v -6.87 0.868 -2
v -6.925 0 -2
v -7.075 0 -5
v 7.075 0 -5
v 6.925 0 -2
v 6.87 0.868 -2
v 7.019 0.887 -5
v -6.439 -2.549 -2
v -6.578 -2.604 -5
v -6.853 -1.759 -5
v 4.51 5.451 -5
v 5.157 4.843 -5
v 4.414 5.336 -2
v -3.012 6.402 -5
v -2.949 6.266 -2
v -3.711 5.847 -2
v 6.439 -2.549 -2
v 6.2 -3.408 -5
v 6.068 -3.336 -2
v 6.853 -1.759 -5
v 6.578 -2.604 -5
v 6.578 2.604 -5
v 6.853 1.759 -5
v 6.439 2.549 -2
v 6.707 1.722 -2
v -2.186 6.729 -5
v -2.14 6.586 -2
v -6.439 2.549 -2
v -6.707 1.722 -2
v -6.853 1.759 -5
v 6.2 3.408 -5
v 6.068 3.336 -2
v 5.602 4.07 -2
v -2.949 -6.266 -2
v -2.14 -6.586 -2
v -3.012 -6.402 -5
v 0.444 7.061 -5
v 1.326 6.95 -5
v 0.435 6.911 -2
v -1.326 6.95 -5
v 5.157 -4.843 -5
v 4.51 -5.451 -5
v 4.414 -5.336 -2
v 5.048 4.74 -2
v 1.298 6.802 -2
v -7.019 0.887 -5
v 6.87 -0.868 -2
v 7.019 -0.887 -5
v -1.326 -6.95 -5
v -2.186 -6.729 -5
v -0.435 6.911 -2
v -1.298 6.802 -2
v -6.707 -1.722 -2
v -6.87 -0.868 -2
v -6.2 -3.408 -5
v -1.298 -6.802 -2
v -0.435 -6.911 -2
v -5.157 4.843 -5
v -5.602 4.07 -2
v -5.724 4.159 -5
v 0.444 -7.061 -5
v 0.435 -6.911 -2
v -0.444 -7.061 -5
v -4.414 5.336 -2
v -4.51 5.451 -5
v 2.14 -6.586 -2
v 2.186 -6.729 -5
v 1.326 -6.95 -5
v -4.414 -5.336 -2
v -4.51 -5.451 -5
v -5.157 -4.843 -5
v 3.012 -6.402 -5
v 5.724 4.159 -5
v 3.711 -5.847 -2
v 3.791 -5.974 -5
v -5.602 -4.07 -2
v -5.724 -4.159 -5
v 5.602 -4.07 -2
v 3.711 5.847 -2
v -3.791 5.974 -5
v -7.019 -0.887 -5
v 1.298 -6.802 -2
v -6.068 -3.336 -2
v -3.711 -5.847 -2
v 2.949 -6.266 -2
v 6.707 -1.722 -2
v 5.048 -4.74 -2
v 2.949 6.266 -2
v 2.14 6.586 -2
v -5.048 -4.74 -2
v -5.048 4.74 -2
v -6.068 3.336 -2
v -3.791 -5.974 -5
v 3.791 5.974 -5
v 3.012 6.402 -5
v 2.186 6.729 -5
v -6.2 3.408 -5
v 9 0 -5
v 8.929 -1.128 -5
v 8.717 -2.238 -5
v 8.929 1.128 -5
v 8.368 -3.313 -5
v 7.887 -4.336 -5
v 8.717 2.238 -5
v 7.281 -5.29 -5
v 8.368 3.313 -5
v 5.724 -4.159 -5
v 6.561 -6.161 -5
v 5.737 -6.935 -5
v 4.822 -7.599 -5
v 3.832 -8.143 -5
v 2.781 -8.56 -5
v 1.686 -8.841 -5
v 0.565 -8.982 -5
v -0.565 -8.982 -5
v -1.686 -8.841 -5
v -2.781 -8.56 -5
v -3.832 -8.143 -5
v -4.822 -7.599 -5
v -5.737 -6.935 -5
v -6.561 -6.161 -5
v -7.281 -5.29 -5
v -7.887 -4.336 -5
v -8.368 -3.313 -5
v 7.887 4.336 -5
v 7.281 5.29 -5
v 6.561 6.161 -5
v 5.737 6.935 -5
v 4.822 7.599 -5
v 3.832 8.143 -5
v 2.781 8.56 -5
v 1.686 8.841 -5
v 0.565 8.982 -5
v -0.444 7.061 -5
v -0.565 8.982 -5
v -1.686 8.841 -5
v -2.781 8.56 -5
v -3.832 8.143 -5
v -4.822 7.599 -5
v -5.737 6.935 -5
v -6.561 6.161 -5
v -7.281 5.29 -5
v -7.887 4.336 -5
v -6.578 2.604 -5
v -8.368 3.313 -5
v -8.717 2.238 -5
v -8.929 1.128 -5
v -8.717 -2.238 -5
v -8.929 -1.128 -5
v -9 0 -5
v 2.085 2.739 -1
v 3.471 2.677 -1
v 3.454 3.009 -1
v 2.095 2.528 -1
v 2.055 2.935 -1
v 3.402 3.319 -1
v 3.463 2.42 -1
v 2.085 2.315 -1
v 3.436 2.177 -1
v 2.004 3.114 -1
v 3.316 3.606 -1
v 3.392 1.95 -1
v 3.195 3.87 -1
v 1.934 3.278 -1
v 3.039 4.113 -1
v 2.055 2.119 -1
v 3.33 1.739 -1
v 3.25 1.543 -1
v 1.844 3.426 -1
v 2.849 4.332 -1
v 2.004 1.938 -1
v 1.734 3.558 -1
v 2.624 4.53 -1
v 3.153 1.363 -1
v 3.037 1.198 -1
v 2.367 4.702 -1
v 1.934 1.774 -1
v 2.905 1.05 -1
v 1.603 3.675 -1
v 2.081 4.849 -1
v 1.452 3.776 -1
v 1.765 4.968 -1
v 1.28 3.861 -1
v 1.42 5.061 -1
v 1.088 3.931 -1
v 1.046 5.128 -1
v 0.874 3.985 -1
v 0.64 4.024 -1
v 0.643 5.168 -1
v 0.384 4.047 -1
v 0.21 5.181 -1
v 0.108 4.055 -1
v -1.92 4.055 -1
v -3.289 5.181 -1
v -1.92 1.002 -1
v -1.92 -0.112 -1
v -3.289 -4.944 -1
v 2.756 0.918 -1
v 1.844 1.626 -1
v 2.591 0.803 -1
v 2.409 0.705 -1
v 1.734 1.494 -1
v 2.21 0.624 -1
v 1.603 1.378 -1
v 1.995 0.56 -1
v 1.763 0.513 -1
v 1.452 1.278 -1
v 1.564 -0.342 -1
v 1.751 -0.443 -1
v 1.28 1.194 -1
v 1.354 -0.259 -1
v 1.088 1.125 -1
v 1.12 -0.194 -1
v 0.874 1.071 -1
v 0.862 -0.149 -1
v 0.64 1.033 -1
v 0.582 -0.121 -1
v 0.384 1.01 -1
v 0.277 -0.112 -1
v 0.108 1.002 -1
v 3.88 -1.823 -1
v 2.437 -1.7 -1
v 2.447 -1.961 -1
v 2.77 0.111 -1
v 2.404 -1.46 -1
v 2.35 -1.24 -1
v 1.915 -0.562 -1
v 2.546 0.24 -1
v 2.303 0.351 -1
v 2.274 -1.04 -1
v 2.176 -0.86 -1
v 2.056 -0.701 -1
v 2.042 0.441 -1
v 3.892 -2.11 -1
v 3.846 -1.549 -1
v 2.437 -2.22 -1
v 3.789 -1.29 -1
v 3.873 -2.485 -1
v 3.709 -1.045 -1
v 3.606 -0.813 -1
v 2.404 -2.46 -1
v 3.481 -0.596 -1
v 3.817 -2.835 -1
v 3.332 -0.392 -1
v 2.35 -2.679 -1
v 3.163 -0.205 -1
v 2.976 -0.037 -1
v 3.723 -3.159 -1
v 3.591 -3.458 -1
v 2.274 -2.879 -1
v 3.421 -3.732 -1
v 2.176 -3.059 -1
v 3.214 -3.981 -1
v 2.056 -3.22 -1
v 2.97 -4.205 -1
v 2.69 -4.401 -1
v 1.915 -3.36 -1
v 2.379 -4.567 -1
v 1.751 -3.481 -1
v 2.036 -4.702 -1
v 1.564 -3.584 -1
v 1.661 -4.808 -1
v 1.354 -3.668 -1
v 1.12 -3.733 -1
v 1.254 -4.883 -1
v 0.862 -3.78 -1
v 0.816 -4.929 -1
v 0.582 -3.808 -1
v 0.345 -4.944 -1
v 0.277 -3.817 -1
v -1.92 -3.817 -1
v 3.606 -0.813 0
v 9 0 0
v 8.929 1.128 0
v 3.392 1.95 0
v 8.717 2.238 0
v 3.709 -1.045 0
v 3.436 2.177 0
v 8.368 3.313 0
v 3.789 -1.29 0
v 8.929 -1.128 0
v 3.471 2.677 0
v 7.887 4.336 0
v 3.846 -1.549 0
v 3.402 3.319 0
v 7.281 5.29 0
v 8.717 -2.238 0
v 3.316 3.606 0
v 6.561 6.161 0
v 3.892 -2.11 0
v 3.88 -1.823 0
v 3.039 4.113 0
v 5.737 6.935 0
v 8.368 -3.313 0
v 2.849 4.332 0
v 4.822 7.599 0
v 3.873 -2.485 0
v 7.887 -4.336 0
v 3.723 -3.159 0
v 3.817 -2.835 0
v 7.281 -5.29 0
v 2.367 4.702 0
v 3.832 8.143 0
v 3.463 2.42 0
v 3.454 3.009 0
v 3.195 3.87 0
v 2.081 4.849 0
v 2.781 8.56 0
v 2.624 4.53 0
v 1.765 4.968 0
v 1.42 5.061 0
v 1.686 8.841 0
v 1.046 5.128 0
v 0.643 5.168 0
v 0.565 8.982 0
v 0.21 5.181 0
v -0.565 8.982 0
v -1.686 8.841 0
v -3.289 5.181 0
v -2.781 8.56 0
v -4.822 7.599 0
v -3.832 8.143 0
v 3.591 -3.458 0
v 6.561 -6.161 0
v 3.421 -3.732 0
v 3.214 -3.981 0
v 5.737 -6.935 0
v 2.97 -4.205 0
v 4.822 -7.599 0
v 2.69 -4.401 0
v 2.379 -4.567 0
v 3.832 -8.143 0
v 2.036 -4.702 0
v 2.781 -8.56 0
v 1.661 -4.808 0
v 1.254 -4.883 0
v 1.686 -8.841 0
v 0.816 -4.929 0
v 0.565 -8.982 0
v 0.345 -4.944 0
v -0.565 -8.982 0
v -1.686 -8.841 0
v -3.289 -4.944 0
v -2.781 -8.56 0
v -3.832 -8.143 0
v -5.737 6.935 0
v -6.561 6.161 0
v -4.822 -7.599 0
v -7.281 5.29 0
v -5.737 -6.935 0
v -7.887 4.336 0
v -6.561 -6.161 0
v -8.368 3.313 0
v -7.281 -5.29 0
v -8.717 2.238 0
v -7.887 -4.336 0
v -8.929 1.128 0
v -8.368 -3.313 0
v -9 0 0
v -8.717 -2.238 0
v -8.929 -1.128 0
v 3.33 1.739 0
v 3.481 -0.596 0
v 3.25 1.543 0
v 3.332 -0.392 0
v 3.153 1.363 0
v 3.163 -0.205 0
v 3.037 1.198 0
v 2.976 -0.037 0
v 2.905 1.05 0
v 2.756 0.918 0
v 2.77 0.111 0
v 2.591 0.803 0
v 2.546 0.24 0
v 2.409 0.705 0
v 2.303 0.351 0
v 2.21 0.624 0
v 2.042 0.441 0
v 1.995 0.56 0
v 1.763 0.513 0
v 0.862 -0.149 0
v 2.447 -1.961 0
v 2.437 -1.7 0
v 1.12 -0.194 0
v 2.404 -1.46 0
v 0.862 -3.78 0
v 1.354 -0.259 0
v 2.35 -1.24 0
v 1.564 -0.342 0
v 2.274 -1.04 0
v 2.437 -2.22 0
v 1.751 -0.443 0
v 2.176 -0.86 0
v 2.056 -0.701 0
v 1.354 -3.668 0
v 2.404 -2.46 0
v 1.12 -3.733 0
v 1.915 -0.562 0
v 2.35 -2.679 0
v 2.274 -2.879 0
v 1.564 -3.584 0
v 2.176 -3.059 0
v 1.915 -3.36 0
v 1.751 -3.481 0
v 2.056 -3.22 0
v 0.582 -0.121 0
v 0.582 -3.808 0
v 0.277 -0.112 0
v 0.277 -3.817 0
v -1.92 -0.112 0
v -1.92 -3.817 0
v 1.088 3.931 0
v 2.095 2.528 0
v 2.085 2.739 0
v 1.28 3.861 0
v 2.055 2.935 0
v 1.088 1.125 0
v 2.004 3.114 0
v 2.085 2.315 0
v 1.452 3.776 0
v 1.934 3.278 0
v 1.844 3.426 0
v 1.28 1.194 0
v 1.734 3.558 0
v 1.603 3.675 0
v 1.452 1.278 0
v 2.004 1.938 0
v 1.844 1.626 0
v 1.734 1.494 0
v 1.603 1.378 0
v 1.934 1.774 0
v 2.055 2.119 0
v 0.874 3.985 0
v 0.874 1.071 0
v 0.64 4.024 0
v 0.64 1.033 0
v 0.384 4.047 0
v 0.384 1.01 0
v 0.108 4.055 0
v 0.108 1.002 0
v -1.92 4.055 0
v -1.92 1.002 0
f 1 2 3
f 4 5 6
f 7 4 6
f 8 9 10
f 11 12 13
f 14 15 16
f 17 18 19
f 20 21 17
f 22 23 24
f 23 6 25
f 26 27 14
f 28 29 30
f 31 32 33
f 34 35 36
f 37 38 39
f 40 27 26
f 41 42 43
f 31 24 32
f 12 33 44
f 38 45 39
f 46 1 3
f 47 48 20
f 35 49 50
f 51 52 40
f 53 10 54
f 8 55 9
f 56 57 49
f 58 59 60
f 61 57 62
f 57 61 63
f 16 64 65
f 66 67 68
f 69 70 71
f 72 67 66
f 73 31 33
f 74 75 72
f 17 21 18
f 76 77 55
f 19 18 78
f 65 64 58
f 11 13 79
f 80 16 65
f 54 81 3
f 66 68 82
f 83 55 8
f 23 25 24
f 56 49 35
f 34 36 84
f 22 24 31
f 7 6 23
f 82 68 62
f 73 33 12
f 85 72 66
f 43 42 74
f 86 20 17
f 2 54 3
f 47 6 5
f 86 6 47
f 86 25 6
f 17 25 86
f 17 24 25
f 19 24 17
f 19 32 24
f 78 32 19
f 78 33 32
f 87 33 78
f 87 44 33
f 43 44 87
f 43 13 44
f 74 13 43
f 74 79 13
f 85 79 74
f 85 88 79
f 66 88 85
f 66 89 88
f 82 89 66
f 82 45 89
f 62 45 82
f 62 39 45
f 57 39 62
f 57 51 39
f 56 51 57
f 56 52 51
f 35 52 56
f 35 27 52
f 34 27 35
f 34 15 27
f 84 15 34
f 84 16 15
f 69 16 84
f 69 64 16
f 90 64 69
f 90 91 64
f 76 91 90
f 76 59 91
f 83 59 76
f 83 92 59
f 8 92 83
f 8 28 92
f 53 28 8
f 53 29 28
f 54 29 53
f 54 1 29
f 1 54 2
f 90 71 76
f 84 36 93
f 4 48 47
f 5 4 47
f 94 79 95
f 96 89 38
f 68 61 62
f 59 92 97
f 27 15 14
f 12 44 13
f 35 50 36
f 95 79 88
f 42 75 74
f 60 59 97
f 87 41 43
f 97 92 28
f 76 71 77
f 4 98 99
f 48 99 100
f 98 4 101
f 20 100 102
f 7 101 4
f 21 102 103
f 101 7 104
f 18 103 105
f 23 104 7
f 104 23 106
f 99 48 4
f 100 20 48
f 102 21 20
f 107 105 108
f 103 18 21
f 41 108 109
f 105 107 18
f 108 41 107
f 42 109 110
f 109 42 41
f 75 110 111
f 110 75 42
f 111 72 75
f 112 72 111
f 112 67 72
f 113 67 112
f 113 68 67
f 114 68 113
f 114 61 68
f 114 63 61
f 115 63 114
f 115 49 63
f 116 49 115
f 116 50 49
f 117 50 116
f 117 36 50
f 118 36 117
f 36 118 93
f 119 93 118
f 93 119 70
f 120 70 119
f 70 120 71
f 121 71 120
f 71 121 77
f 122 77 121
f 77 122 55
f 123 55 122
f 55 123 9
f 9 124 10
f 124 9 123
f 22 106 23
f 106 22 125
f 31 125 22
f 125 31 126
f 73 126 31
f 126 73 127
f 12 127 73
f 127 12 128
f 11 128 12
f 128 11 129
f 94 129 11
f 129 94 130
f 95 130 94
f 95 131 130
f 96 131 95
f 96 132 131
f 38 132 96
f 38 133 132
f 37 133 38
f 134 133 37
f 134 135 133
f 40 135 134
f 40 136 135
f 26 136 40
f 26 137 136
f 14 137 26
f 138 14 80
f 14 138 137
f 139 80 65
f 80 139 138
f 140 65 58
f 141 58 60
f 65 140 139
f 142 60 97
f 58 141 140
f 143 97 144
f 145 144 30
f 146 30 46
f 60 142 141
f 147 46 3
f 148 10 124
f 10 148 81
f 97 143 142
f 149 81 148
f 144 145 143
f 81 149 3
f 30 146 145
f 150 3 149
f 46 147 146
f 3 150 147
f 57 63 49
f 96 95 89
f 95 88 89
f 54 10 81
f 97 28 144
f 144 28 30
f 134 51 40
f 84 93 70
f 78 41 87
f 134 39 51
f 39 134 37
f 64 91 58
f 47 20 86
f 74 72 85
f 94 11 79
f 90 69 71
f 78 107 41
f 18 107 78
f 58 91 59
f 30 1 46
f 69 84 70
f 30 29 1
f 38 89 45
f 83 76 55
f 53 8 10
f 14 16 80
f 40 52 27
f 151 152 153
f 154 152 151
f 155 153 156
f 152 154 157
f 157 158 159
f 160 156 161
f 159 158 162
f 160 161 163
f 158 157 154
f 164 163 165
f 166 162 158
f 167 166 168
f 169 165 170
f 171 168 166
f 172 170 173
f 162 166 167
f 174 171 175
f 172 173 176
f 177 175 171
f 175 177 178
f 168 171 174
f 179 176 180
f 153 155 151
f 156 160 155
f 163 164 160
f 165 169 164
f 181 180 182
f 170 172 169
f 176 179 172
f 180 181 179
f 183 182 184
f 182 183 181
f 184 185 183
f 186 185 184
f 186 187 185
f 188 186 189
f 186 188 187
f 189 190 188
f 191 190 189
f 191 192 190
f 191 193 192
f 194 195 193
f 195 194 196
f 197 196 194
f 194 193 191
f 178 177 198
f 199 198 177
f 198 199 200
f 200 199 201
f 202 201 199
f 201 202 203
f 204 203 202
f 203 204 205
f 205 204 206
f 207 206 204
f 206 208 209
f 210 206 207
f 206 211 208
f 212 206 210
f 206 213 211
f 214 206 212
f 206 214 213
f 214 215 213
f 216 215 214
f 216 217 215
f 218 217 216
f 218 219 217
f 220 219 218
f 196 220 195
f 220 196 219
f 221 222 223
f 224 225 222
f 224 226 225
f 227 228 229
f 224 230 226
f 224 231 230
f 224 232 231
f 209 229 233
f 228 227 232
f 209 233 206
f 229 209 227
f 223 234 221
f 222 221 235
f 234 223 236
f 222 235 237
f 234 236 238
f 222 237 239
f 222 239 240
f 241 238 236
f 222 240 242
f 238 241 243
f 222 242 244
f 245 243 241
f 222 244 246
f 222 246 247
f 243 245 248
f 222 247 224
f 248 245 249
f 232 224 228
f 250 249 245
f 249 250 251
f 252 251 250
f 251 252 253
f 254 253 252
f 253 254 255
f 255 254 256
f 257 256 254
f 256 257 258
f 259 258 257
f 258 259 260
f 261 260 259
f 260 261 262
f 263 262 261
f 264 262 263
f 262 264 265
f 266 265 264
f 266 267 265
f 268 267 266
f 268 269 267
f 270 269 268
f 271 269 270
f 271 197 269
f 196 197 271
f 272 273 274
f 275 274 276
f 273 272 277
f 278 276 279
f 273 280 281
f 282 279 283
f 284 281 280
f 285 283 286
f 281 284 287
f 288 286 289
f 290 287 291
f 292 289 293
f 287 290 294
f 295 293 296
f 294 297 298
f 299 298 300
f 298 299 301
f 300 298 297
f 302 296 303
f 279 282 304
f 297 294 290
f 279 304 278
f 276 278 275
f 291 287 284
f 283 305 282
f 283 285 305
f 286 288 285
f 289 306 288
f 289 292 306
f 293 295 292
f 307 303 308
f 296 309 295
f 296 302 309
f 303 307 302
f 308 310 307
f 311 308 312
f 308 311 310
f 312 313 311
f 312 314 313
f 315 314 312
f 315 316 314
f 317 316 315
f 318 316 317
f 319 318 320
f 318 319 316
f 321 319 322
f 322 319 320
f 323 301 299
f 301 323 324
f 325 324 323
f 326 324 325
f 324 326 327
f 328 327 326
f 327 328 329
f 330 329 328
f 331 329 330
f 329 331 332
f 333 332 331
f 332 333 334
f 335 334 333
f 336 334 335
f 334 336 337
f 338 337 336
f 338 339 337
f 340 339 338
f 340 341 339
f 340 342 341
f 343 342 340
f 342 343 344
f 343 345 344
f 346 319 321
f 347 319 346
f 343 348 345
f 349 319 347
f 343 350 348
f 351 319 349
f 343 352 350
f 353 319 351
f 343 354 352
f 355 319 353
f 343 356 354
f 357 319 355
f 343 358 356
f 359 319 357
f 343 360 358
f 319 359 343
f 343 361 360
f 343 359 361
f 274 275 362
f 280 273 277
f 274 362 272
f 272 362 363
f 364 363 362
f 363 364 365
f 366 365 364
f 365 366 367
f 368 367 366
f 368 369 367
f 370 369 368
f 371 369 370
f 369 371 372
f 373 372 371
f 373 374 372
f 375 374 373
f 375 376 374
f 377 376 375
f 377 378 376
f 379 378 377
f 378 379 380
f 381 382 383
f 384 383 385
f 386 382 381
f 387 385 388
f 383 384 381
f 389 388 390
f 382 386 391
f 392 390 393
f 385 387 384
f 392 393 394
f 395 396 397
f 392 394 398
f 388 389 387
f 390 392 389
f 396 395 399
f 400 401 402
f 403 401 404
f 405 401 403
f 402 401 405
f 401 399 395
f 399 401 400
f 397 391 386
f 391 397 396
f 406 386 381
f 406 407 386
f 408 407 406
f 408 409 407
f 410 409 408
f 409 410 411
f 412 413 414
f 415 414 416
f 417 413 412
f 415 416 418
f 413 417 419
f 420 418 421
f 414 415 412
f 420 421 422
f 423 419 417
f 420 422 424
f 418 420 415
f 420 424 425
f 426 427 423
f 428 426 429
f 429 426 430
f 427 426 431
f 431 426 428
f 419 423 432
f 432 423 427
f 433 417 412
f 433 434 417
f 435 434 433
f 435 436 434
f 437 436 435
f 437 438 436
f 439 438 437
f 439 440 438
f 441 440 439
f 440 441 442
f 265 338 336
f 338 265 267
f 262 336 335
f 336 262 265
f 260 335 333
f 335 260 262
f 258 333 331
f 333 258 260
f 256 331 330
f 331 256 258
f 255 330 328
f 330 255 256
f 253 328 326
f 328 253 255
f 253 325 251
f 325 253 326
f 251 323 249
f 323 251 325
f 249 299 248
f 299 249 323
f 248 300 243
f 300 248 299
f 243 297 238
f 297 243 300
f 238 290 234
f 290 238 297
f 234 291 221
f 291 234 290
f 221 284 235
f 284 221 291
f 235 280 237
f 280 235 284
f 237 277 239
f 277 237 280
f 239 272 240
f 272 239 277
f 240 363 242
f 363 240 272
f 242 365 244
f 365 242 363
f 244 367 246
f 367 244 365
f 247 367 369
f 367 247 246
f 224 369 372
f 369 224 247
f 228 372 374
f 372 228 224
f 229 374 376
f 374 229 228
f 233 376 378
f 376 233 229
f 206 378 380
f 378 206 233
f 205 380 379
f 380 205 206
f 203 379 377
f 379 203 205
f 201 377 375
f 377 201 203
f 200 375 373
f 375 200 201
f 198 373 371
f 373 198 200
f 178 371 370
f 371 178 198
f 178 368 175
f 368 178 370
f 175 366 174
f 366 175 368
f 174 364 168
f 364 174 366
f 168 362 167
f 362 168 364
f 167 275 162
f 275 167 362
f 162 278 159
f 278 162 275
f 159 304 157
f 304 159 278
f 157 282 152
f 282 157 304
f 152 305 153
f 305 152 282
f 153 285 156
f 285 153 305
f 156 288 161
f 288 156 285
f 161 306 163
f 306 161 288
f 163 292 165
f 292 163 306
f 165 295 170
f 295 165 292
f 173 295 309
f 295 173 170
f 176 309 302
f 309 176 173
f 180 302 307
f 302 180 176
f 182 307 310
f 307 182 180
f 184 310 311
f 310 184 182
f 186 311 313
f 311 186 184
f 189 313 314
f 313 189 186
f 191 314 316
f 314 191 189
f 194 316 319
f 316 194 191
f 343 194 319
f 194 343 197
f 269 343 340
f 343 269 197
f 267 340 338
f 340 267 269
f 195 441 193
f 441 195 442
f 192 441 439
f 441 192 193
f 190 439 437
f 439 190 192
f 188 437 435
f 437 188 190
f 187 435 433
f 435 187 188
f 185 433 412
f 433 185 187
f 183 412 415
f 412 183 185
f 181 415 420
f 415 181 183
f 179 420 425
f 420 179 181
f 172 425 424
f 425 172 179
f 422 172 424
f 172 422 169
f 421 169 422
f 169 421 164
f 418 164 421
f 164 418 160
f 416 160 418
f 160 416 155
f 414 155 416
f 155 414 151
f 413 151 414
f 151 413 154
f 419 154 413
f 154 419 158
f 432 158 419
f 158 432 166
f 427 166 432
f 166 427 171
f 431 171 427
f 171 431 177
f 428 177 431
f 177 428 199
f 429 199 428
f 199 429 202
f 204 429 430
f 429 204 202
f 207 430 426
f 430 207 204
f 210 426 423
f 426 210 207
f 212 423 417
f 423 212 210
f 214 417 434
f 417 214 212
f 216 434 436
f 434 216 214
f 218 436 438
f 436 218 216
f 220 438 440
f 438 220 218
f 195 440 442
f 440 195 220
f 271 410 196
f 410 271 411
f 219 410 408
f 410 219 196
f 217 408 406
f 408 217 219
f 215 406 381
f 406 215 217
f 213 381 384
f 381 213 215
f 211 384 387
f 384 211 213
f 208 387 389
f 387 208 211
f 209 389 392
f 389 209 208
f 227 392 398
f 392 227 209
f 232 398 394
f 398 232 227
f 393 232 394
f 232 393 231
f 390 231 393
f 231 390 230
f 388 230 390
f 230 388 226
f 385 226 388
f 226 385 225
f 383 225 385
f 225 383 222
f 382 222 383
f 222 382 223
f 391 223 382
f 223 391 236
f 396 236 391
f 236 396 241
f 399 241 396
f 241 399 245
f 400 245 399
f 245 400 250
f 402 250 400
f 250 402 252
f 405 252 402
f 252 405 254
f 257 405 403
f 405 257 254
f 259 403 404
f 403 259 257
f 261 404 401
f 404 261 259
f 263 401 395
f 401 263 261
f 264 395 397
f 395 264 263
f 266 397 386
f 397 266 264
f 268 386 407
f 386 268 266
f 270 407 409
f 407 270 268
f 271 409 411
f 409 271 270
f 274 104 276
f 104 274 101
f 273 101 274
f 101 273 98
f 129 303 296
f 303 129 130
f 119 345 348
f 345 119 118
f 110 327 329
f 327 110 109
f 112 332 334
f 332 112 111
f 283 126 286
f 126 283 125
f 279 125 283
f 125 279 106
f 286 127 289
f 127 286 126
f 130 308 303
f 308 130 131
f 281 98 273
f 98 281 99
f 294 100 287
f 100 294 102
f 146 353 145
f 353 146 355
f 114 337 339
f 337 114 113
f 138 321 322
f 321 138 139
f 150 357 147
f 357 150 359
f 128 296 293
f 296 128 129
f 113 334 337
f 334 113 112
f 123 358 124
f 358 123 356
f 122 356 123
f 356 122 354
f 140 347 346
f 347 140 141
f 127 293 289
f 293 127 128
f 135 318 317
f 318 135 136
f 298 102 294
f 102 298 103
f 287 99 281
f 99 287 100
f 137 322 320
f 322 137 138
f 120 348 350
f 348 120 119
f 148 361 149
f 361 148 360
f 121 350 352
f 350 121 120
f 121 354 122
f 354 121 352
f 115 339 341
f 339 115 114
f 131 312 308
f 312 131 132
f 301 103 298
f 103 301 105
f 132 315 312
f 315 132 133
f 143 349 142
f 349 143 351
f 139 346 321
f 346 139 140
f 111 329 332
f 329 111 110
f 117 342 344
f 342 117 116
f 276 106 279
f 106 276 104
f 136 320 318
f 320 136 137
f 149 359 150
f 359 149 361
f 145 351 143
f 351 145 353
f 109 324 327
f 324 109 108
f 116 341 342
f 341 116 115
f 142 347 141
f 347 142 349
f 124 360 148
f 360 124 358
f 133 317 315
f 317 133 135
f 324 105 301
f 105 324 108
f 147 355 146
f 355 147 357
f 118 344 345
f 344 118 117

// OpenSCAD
$fn = 50;


difference() {
	union() {
		translate(v = [0, 0, -5.0000000000]) {
			cylinder(h = 5, r = 9.0000000000);
		}
	}
	union() {
		#translate(v = [0, 0, -5.0000000000]) {
			cylinder(h = 3, r1 = 7.0750000000, r2 = 6.9250000000);
		}
		translate(v = [0, 0, -1]) {
			linear_extrude(height = 1) {
				text(font = "Impact", halign = "center", size = 10, text = "B", valign = "center");
			}
		}
	}
}
